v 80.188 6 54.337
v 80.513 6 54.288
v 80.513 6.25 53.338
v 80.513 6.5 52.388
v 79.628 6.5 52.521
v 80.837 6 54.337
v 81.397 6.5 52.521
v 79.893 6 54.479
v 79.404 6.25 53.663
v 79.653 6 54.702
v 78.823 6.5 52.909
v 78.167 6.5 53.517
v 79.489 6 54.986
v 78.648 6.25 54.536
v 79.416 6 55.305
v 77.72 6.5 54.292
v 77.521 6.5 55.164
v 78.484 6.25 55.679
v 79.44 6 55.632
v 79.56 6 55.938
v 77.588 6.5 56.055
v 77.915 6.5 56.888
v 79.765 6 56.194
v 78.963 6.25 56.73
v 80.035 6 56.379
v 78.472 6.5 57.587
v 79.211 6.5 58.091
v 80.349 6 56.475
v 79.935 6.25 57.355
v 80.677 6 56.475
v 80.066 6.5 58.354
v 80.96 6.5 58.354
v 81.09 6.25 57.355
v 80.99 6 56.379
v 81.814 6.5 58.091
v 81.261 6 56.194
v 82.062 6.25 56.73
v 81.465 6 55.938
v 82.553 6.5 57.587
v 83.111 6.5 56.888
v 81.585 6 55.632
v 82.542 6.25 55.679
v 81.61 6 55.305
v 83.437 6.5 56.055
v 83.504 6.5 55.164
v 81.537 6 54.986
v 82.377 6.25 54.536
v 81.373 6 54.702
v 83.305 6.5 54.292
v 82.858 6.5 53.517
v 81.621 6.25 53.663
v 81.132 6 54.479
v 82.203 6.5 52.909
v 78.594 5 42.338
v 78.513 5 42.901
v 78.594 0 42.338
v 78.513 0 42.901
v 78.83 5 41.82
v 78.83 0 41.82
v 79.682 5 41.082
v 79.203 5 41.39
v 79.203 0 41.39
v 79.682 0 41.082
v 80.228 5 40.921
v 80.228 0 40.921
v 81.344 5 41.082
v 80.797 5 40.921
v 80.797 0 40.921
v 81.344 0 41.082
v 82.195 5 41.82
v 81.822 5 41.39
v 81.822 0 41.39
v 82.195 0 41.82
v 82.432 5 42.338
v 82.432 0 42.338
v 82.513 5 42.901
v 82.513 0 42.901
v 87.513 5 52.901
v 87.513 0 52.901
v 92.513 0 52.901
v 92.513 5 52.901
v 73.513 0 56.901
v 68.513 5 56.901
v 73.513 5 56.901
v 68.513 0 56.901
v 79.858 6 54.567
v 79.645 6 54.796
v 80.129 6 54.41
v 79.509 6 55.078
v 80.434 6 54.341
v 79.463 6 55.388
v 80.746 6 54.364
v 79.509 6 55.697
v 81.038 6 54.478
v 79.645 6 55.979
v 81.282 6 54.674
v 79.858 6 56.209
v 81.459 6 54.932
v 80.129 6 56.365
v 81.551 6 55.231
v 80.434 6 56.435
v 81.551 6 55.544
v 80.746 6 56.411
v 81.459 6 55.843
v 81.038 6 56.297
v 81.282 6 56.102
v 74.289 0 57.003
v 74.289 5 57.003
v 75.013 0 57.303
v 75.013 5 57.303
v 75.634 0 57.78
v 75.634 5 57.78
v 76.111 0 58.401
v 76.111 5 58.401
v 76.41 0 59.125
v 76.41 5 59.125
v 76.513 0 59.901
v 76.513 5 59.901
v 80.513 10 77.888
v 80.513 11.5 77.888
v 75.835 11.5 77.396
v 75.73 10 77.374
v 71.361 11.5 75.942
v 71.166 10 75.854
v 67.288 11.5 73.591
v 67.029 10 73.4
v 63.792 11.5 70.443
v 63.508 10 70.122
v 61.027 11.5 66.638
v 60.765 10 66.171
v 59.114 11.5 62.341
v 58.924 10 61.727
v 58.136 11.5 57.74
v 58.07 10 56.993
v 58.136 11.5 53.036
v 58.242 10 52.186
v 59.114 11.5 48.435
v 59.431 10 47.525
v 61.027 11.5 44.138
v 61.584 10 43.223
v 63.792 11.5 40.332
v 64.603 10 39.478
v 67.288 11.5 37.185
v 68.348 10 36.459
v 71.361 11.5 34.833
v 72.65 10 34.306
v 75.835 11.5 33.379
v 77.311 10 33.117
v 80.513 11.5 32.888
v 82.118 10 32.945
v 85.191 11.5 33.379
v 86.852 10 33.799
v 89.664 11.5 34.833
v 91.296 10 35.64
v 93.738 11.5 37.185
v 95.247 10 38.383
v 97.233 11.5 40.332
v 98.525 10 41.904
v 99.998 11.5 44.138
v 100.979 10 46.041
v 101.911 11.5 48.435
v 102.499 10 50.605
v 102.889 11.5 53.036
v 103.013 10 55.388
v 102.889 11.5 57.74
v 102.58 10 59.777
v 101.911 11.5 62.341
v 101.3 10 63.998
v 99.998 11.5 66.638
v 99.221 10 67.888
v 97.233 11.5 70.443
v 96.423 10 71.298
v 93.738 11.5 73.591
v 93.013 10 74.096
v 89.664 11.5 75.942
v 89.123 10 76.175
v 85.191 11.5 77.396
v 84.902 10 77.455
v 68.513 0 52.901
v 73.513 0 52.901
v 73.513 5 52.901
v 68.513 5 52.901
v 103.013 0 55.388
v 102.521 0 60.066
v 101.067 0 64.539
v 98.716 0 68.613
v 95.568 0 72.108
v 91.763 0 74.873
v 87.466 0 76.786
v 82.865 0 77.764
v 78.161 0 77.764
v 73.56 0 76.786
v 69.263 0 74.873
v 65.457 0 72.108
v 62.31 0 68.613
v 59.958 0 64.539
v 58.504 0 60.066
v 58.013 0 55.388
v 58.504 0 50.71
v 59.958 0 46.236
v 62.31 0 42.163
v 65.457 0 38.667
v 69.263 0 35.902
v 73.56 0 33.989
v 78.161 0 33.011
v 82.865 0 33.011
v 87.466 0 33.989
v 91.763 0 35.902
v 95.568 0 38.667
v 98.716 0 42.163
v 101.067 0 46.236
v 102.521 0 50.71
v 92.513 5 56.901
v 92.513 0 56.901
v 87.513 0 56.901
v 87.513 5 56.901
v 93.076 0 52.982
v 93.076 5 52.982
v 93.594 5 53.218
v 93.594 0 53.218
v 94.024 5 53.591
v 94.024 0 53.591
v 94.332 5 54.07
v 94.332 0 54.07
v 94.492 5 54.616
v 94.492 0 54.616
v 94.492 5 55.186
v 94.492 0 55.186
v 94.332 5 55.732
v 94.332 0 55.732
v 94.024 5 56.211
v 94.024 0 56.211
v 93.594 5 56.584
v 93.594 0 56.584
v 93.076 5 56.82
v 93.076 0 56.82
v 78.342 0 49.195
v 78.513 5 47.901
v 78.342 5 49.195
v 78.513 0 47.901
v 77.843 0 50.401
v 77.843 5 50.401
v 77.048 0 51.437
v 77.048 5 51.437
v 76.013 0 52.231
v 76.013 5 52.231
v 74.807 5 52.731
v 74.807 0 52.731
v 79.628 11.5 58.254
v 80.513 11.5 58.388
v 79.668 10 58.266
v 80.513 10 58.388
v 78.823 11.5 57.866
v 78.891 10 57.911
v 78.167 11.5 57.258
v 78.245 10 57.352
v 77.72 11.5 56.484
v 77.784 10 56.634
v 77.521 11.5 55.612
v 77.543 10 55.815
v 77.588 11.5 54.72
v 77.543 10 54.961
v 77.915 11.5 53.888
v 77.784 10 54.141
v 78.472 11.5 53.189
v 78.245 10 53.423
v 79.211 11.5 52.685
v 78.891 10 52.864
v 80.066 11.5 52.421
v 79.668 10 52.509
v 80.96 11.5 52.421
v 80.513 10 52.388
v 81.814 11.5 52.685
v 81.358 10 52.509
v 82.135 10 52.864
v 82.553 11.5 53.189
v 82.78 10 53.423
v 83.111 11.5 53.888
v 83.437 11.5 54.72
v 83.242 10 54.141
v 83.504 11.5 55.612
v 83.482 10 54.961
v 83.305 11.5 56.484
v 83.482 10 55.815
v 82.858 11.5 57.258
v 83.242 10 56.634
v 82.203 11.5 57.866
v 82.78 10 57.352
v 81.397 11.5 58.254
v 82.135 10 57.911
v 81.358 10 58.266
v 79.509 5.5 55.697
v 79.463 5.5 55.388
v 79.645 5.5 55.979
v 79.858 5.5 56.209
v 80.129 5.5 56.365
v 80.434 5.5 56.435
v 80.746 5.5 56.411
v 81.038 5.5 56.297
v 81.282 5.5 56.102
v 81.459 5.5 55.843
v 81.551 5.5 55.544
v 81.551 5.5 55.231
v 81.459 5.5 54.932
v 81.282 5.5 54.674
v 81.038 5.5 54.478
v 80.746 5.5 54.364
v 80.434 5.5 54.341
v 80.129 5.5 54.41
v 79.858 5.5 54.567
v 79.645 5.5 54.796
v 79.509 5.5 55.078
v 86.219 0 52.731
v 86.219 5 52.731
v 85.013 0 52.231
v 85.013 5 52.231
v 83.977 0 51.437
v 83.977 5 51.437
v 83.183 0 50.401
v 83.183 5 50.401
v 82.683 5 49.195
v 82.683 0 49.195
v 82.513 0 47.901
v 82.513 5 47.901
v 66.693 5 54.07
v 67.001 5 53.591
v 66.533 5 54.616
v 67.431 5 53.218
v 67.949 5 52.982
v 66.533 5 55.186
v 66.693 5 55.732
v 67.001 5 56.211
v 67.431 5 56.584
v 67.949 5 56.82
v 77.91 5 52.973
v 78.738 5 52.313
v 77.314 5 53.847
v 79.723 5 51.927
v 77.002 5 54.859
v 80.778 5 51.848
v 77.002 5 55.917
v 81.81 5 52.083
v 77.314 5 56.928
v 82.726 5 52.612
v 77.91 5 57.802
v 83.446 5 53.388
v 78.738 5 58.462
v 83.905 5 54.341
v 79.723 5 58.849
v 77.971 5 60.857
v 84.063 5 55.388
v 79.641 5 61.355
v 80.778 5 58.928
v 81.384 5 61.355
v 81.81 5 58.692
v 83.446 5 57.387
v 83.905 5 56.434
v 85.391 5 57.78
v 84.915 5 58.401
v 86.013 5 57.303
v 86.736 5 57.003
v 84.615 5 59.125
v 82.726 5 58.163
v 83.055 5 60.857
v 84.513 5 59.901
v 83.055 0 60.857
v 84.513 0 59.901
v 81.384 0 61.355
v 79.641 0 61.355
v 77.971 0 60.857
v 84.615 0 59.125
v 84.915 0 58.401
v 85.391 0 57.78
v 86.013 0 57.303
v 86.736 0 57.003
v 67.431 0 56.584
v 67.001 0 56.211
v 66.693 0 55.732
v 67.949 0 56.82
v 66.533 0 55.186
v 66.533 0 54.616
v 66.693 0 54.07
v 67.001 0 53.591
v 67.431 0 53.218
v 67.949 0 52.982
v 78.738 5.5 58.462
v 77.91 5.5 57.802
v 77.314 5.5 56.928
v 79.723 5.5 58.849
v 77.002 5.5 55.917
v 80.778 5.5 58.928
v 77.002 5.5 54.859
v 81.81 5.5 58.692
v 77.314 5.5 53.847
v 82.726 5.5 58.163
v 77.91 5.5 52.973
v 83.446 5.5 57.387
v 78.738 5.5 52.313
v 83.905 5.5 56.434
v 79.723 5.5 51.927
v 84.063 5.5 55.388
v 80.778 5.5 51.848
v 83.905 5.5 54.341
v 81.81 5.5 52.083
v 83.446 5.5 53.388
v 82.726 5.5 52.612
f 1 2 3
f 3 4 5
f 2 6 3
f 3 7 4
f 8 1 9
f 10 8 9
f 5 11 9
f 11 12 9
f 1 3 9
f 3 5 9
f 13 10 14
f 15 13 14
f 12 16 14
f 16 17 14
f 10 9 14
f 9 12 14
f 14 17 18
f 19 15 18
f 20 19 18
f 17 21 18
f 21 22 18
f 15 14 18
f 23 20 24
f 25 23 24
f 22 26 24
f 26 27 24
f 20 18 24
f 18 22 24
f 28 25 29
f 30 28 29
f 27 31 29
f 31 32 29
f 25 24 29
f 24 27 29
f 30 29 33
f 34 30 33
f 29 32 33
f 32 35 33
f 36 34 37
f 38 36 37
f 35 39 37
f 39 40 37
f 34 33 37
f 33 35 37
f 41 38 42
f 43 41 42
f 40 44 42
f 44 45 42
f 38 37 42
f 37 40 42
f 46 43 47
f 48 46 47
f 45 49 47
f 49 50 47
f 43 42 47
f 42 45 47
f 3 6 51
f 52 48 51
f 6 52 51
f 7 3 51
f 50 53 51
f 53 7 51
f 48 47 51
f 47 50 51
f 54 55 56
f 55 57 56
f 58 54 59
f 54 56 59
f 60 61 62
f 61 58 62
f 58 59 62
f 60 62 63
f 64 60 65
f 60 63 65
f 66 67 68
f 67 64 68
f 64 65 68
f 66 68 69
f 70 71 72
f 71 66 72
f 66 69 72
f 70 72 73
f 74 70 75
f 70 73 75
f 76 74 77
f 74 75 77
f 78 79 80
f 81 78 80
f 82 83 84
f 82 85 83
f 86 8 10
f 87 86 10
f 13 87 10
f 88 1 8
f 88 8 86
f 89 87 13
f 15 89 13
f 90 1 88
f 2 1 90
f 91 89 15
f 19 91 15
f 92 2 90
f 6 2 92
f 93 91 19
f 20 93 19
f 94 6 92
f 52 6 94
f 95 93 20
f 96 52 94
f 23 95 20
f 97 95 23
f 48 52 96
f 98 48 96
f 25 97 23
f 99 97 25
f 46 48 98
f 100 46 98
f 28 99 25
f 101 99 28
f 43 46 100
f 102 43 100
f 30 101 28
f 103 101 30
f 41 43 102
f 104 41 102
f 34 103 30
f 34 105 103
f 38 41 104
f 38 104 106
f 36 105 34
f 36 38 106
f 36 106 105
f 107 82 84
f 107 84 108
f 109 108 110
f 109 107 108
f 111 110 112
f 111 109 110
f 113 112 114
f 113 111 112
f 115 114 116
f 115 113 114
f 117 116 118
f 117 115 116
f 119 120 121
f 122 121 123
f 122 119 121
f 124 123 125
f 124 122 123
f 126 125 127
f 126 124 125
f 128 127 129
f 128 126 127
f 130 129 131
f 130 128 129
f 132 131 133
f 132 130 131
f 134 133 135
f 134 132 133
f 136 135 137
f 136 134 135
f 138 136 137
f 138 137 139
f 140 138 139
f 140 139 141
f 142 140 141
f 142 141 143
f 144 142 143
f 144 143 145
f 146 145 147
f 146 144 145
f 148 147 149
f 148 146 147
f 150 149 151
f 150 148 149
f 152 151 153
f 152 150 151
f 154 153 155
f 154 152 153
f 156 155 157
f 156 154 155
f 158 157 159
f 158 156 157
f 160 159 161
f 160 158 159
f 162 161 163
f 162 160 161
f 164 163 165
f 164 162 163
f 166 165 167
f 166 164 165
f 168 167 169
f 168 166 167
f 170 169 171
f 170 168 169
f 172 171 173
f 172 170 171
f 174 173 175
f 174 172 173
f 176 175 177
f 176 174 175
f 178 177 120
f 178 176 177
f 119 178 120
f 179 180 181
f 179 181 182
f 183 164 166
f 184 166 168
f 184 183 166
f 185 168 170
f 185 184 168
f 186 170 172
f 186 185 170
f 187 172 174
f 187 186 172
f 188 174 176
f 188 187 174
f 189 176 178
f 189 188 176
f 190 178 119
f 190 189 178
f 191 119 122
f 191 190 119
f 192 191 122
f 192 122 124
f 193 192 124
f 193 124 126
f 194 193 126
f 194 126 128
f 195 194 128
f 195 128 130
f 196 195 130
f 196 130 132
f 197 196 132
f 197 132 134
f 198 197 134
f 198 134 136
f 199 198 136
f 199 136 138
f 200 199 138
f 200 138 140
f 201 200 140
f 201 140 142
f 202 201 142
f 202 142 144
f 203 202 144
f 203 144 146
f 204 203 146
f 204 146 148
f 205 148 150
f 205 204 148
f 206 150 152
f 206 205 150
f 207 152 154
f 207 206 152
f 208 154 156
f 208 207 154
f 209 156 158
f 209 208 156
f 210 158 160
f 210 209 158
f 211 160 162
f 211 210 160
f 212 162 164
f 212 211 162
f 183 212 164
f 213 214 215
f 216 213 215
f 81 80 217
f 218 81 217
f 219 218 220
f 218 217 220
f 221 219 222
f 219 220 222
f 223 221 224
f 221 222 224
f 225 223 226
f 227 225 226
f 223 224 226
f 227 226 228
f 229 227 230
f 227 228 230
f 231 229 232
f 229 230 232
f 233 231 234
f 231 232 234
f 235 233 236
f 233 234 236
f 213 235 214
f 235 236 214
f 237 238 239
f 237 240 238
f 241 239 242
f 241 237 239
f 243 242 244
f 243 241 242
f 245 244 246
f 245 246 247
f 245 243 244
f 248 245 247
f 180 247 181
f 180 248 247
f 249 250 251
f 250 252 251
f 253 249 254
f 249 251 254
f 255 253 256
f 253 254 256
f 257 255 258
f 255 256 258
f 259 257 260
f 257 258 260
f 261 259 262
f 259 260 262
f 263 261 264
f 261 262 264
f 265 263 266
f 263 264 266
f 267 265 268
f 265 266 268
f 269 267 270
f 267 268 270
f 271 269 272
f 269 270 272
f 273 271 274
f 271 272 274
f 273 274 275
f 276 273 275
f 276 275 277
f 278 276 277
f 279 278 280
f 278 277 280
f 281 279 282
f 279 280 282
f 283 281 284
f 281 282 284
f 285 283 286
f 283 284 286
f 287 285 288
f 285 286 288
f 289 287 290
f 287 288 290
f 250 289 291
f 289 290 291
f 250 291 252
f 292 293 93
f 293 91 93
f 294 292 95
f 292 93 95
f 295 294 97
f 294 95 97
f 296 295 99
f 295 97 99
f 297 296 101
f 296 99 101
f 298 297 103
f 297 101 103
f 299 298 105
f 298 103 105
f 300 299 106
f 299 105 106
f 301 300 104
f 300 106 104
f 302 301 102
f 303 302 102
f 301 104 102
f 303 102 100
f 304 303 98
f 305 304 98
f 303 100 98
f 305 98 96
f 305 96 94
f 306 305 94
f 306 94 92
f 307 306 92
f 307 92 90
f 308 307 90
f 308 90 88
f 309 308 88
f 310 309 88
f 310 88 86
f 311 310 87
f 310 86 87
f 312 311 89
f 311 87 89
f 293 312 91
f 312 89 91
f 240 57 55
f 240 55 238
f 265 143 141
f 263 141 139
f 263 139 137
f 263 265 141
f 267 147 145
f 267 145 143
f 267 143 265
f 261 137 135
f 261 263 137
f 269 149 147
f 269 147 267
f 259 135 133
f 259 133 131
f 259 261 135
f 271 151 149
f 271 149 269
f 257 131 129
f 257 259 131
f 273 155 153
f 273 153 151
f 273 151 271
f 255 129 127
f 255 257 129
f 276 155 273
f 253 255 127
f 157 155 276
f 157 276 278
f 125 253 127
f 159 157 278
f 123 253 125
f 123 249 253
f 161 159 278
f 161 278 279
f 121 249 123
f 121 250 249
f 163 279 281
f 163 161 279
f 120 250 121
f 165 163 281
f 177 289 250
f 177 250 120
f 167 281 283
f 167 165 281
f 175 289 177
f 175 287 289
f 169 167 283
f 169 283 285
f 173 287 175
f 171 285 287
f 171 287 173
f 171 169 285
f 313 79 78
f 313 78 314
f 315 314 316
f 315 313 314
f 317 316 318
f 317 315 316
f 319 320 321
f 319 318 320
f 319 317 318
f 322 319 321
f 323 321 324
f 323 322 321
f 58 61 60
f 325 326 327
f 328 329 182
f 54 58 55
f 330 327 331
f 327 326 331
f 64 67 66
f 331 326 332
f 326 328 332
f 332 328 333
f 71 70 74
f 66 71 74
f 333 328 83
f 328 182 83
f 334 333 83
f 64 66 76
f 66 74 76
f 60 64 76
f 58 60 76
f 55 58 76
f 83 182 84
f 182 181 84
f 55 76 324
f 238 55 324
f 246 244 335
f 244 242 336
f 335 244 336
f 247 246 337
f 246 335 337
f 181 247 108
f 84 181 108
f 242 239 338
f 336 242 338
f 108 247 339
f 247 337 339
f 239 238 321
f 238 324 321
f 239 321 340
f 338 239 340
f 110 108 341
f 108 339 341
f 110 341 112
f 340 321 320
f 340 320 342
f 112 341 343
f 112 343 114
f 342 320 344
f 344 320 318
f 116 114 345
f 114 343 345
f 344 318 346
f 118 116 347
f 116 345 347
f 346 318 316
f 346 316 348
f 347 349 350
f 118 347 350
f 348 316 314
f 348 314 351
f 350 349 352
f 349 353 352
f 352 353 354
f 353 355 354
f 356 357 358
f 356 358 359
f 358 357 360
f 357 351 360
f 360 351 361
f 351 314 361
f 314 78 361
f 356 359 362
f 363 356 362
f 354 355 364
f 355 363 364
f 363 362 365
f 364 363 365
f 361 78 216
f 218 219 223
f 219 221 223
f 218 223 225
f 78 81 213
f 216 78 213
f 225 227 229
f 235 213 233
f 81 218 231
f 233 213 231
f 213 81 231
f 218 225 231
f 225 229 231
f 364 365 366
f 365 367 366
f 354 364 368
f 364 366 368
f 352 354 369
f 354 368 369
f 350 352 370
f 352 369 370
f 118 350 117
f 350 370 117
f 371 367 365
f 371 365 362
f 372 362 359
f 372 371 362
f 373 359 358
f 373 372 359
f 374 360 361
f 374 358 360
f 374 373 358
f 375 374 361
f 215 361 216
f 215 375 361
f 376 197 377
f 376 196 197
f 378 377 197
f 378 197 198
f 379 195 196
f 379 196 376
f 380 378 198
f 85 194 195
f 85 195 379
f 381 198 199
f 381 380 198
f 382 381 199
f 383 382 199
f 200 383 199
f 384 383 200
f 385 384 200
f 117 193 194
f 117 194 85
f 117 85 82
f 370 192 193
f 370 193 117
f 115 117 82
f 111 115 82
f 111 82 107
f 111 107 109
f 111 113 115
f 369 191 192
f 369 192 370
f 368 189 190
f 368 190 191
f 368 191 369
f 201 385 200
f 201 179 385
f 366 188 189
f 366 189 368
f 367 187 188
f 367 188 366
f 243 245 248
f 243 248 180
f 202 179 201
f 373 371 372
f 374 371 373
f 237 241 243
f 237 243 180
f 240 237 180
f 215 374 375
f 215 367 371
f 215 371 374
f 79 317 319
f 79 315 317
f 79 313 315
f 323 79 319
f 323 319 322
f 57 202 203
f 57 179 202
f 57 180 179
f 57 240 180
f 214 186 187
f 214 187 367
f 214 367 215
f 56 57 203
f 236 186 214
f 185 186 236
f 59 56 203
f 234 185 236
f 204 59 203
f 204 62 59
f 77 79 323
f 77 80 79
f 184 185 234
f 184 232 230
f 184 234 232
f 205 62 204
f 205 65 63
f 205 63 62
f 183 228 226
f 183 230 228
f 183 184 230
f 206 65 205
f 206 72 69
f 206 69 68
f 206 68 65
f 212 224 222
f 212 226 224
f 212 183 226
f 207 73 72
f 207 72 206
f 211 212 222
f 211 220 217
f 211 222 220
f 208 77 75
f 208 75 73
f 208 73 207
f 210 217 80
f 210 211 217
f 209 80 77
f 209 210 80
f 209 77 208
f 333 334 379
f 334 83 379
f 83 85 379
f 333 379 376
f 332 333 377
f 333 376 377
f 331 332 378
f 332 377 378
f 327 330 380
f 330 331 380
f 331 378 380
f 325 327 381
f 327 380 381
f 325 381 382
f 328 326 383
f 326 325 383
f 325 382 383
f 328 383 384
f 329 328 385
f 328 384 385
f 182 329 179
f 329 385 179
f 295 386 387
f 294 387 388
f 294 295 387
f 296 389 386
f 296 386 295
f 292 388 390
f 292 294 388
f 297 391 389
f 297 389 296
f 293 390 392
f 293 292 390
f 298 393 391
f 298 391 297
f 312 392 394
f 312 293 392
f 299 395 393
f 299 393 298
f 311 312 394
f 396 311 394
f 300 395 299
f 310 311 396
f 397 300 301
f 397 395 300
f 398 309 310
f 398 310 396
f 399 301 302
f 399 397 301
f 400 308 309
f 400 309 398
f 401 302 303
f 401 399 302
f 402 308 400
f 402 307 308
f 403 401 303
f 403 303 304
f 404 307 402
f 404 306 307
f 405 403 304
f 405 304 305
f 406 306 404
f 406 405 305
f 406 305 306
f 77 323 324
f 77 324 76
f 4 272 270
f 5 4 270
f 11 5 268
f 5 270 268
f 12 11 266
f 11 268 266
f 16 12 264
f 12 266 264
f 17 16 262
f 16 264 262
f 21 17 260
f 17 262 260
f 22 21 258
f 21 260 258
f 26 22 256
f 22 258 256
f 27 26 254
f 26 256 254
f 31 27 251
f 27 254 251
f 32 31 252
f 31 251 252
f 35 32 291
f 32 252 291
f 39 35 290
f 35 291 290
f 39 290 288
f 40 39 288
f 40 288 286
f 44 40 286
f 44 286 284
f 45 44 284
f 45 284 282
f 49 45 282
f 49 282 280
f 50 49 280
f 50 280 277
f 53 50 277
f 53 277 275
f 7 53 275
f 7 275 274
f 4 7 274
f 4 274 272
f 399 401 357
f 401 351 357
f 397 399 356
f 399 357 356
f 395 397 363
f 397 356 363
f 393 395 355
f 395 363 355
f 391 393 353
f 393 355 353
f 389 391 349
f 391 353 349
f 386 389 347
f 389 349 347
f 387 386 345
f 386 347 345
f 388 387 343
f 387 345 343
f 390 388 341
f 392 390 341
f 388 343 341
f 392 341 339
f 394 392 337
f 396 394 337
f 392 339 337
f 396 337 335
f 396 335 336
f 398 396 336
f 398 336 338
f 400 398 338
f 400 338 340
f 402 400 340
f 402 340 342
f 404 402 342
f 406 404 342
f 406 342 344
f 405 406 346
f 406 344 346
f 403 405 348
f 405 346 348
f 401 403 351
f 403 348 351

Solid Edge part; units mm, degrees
sketch "Sketch1" plane through (0, 0, 0) normal (0, -1, 0) x (1, 0, 0)
  circle A0 centre (80.5127, 55.3877) radius 22.5
  dimension "D1" = 45
extrude "ExtrudedProtrusion_1" add sketch "Sketch1" against normal blind 10
sketch "Sketch2" plane through (63.9305, 0, 41.9251) normal (0, -1, 0) x (1, 0, 0)
  line L0 (18.5822, 5.9759) -> (18.5822, 0.9759)
  arc A0 (18.5822, 0.9759) -> (14.5822, 0.9759) centre (16.5822, 0.9759) cw
  line L1 (14.5822, 0.9759) -> (14.5822, 5.9759)
  arc A1 (14.5822, 5.9759) -> (9.5822, 10.9759) centre (9.5822, 5.9759) ccw
  line L2 (9.5822, 10.9759) -> (4.5822, 10.9759)
  arc A2 (4.5822, 10.9759) -> (4.5822, 14.9759) centre (4.5822, 12.9759) cw
  line L3 (4.5822, 14.9759) -> (9.5822, 14.9759)
  arc A3 (9.5822, 14.9759) -> (12.5822, 17.9759) centre (9.5822, 17.9759) ccw
  arc A4 (12.5822, 17.9759) -> (20.5822, 17.9759) centre (16.5822, 13.4626) cw
  arc A5 (23.5822, 14.9759) -> (20.5822, 17.9759) centre (23.5822, 17.9759) cw
  line L4 (28.5822, 14.9759) -> (23.5822, 14.9759)
  arc A6 (28.5822, 10.9759) -> (28.5822, 14.9759) centre (28.5822, 12.9759) ccw
  line L5 (23.5822, 10.9759) -> (28.5822, 10.9759)
  arc A7 (18.5822, 5.9759) -> (23.5822, 10.9759) centre (23.5822, 5.9759) cw
  dimension "D1" = 5
  dimension "D2" = 2
  dimension "D3" = 5
  dimension "D4" = 5
  dimension "D5" = 5
  dimension "D6" = 2
  dimension "D7" = 5
  dimension "D8" = 5
  dimension "D9" = 2
  dimension "D10" = 5
  dimension "D11" = 5
  dimension "D12" = 3
  dimension "D13" = 3
extrude "Cutout1" cut sketch "Sketch2" against normal blind 5
sketch "Sketch3" plane through (80.5127, 10, 55.3877) normal (0, 1, 0) x (0, 0, -1)
  circle A0 centre (0, 0) radius 3
extrude "ExtrudedCutout_5" cut sketch "Sketch3" against normal blind 4
sketch "Sketch4" plane through (80.5127, 6, 55.3877) normal (0, 1, 0) x (-1, 0, 0)
  circle A0 centre (0, 0) radius 1.05
  dimension "D1" = 2.1
extrude "Cutout2" cut sketch "Sketch4" against normal up to next
sketch "Sketch5" plane through (80.5127, 5, 51.1598) normal (0, -1, 0) x (1, 0, 0)
  circle A0 centre (0, 4.2279) radius 3.55
extrude "ExtrudedCutout_7" cut sketch "Sketch5" against normal blind 0.5
chamfer "Chamfer_2" distance 1.9 distance2 0.5 1 edges at (80.5127, 6, 58.3877) measured on face at (78.5727, 6, 53.3277)
sketch "Sketch6" plane through (80.5127, 10, 55.3877) normal (0, 1, 0) x (0, 0, 1)
  circle A0 centre (0, 0) radius 22.5
  circle A1 centre (0, 0) radius 3
  dimension "D1" = 45
extrude "ExtrudedProtrusion_4" add sketch "Sketch6" along normal blind 1.5
